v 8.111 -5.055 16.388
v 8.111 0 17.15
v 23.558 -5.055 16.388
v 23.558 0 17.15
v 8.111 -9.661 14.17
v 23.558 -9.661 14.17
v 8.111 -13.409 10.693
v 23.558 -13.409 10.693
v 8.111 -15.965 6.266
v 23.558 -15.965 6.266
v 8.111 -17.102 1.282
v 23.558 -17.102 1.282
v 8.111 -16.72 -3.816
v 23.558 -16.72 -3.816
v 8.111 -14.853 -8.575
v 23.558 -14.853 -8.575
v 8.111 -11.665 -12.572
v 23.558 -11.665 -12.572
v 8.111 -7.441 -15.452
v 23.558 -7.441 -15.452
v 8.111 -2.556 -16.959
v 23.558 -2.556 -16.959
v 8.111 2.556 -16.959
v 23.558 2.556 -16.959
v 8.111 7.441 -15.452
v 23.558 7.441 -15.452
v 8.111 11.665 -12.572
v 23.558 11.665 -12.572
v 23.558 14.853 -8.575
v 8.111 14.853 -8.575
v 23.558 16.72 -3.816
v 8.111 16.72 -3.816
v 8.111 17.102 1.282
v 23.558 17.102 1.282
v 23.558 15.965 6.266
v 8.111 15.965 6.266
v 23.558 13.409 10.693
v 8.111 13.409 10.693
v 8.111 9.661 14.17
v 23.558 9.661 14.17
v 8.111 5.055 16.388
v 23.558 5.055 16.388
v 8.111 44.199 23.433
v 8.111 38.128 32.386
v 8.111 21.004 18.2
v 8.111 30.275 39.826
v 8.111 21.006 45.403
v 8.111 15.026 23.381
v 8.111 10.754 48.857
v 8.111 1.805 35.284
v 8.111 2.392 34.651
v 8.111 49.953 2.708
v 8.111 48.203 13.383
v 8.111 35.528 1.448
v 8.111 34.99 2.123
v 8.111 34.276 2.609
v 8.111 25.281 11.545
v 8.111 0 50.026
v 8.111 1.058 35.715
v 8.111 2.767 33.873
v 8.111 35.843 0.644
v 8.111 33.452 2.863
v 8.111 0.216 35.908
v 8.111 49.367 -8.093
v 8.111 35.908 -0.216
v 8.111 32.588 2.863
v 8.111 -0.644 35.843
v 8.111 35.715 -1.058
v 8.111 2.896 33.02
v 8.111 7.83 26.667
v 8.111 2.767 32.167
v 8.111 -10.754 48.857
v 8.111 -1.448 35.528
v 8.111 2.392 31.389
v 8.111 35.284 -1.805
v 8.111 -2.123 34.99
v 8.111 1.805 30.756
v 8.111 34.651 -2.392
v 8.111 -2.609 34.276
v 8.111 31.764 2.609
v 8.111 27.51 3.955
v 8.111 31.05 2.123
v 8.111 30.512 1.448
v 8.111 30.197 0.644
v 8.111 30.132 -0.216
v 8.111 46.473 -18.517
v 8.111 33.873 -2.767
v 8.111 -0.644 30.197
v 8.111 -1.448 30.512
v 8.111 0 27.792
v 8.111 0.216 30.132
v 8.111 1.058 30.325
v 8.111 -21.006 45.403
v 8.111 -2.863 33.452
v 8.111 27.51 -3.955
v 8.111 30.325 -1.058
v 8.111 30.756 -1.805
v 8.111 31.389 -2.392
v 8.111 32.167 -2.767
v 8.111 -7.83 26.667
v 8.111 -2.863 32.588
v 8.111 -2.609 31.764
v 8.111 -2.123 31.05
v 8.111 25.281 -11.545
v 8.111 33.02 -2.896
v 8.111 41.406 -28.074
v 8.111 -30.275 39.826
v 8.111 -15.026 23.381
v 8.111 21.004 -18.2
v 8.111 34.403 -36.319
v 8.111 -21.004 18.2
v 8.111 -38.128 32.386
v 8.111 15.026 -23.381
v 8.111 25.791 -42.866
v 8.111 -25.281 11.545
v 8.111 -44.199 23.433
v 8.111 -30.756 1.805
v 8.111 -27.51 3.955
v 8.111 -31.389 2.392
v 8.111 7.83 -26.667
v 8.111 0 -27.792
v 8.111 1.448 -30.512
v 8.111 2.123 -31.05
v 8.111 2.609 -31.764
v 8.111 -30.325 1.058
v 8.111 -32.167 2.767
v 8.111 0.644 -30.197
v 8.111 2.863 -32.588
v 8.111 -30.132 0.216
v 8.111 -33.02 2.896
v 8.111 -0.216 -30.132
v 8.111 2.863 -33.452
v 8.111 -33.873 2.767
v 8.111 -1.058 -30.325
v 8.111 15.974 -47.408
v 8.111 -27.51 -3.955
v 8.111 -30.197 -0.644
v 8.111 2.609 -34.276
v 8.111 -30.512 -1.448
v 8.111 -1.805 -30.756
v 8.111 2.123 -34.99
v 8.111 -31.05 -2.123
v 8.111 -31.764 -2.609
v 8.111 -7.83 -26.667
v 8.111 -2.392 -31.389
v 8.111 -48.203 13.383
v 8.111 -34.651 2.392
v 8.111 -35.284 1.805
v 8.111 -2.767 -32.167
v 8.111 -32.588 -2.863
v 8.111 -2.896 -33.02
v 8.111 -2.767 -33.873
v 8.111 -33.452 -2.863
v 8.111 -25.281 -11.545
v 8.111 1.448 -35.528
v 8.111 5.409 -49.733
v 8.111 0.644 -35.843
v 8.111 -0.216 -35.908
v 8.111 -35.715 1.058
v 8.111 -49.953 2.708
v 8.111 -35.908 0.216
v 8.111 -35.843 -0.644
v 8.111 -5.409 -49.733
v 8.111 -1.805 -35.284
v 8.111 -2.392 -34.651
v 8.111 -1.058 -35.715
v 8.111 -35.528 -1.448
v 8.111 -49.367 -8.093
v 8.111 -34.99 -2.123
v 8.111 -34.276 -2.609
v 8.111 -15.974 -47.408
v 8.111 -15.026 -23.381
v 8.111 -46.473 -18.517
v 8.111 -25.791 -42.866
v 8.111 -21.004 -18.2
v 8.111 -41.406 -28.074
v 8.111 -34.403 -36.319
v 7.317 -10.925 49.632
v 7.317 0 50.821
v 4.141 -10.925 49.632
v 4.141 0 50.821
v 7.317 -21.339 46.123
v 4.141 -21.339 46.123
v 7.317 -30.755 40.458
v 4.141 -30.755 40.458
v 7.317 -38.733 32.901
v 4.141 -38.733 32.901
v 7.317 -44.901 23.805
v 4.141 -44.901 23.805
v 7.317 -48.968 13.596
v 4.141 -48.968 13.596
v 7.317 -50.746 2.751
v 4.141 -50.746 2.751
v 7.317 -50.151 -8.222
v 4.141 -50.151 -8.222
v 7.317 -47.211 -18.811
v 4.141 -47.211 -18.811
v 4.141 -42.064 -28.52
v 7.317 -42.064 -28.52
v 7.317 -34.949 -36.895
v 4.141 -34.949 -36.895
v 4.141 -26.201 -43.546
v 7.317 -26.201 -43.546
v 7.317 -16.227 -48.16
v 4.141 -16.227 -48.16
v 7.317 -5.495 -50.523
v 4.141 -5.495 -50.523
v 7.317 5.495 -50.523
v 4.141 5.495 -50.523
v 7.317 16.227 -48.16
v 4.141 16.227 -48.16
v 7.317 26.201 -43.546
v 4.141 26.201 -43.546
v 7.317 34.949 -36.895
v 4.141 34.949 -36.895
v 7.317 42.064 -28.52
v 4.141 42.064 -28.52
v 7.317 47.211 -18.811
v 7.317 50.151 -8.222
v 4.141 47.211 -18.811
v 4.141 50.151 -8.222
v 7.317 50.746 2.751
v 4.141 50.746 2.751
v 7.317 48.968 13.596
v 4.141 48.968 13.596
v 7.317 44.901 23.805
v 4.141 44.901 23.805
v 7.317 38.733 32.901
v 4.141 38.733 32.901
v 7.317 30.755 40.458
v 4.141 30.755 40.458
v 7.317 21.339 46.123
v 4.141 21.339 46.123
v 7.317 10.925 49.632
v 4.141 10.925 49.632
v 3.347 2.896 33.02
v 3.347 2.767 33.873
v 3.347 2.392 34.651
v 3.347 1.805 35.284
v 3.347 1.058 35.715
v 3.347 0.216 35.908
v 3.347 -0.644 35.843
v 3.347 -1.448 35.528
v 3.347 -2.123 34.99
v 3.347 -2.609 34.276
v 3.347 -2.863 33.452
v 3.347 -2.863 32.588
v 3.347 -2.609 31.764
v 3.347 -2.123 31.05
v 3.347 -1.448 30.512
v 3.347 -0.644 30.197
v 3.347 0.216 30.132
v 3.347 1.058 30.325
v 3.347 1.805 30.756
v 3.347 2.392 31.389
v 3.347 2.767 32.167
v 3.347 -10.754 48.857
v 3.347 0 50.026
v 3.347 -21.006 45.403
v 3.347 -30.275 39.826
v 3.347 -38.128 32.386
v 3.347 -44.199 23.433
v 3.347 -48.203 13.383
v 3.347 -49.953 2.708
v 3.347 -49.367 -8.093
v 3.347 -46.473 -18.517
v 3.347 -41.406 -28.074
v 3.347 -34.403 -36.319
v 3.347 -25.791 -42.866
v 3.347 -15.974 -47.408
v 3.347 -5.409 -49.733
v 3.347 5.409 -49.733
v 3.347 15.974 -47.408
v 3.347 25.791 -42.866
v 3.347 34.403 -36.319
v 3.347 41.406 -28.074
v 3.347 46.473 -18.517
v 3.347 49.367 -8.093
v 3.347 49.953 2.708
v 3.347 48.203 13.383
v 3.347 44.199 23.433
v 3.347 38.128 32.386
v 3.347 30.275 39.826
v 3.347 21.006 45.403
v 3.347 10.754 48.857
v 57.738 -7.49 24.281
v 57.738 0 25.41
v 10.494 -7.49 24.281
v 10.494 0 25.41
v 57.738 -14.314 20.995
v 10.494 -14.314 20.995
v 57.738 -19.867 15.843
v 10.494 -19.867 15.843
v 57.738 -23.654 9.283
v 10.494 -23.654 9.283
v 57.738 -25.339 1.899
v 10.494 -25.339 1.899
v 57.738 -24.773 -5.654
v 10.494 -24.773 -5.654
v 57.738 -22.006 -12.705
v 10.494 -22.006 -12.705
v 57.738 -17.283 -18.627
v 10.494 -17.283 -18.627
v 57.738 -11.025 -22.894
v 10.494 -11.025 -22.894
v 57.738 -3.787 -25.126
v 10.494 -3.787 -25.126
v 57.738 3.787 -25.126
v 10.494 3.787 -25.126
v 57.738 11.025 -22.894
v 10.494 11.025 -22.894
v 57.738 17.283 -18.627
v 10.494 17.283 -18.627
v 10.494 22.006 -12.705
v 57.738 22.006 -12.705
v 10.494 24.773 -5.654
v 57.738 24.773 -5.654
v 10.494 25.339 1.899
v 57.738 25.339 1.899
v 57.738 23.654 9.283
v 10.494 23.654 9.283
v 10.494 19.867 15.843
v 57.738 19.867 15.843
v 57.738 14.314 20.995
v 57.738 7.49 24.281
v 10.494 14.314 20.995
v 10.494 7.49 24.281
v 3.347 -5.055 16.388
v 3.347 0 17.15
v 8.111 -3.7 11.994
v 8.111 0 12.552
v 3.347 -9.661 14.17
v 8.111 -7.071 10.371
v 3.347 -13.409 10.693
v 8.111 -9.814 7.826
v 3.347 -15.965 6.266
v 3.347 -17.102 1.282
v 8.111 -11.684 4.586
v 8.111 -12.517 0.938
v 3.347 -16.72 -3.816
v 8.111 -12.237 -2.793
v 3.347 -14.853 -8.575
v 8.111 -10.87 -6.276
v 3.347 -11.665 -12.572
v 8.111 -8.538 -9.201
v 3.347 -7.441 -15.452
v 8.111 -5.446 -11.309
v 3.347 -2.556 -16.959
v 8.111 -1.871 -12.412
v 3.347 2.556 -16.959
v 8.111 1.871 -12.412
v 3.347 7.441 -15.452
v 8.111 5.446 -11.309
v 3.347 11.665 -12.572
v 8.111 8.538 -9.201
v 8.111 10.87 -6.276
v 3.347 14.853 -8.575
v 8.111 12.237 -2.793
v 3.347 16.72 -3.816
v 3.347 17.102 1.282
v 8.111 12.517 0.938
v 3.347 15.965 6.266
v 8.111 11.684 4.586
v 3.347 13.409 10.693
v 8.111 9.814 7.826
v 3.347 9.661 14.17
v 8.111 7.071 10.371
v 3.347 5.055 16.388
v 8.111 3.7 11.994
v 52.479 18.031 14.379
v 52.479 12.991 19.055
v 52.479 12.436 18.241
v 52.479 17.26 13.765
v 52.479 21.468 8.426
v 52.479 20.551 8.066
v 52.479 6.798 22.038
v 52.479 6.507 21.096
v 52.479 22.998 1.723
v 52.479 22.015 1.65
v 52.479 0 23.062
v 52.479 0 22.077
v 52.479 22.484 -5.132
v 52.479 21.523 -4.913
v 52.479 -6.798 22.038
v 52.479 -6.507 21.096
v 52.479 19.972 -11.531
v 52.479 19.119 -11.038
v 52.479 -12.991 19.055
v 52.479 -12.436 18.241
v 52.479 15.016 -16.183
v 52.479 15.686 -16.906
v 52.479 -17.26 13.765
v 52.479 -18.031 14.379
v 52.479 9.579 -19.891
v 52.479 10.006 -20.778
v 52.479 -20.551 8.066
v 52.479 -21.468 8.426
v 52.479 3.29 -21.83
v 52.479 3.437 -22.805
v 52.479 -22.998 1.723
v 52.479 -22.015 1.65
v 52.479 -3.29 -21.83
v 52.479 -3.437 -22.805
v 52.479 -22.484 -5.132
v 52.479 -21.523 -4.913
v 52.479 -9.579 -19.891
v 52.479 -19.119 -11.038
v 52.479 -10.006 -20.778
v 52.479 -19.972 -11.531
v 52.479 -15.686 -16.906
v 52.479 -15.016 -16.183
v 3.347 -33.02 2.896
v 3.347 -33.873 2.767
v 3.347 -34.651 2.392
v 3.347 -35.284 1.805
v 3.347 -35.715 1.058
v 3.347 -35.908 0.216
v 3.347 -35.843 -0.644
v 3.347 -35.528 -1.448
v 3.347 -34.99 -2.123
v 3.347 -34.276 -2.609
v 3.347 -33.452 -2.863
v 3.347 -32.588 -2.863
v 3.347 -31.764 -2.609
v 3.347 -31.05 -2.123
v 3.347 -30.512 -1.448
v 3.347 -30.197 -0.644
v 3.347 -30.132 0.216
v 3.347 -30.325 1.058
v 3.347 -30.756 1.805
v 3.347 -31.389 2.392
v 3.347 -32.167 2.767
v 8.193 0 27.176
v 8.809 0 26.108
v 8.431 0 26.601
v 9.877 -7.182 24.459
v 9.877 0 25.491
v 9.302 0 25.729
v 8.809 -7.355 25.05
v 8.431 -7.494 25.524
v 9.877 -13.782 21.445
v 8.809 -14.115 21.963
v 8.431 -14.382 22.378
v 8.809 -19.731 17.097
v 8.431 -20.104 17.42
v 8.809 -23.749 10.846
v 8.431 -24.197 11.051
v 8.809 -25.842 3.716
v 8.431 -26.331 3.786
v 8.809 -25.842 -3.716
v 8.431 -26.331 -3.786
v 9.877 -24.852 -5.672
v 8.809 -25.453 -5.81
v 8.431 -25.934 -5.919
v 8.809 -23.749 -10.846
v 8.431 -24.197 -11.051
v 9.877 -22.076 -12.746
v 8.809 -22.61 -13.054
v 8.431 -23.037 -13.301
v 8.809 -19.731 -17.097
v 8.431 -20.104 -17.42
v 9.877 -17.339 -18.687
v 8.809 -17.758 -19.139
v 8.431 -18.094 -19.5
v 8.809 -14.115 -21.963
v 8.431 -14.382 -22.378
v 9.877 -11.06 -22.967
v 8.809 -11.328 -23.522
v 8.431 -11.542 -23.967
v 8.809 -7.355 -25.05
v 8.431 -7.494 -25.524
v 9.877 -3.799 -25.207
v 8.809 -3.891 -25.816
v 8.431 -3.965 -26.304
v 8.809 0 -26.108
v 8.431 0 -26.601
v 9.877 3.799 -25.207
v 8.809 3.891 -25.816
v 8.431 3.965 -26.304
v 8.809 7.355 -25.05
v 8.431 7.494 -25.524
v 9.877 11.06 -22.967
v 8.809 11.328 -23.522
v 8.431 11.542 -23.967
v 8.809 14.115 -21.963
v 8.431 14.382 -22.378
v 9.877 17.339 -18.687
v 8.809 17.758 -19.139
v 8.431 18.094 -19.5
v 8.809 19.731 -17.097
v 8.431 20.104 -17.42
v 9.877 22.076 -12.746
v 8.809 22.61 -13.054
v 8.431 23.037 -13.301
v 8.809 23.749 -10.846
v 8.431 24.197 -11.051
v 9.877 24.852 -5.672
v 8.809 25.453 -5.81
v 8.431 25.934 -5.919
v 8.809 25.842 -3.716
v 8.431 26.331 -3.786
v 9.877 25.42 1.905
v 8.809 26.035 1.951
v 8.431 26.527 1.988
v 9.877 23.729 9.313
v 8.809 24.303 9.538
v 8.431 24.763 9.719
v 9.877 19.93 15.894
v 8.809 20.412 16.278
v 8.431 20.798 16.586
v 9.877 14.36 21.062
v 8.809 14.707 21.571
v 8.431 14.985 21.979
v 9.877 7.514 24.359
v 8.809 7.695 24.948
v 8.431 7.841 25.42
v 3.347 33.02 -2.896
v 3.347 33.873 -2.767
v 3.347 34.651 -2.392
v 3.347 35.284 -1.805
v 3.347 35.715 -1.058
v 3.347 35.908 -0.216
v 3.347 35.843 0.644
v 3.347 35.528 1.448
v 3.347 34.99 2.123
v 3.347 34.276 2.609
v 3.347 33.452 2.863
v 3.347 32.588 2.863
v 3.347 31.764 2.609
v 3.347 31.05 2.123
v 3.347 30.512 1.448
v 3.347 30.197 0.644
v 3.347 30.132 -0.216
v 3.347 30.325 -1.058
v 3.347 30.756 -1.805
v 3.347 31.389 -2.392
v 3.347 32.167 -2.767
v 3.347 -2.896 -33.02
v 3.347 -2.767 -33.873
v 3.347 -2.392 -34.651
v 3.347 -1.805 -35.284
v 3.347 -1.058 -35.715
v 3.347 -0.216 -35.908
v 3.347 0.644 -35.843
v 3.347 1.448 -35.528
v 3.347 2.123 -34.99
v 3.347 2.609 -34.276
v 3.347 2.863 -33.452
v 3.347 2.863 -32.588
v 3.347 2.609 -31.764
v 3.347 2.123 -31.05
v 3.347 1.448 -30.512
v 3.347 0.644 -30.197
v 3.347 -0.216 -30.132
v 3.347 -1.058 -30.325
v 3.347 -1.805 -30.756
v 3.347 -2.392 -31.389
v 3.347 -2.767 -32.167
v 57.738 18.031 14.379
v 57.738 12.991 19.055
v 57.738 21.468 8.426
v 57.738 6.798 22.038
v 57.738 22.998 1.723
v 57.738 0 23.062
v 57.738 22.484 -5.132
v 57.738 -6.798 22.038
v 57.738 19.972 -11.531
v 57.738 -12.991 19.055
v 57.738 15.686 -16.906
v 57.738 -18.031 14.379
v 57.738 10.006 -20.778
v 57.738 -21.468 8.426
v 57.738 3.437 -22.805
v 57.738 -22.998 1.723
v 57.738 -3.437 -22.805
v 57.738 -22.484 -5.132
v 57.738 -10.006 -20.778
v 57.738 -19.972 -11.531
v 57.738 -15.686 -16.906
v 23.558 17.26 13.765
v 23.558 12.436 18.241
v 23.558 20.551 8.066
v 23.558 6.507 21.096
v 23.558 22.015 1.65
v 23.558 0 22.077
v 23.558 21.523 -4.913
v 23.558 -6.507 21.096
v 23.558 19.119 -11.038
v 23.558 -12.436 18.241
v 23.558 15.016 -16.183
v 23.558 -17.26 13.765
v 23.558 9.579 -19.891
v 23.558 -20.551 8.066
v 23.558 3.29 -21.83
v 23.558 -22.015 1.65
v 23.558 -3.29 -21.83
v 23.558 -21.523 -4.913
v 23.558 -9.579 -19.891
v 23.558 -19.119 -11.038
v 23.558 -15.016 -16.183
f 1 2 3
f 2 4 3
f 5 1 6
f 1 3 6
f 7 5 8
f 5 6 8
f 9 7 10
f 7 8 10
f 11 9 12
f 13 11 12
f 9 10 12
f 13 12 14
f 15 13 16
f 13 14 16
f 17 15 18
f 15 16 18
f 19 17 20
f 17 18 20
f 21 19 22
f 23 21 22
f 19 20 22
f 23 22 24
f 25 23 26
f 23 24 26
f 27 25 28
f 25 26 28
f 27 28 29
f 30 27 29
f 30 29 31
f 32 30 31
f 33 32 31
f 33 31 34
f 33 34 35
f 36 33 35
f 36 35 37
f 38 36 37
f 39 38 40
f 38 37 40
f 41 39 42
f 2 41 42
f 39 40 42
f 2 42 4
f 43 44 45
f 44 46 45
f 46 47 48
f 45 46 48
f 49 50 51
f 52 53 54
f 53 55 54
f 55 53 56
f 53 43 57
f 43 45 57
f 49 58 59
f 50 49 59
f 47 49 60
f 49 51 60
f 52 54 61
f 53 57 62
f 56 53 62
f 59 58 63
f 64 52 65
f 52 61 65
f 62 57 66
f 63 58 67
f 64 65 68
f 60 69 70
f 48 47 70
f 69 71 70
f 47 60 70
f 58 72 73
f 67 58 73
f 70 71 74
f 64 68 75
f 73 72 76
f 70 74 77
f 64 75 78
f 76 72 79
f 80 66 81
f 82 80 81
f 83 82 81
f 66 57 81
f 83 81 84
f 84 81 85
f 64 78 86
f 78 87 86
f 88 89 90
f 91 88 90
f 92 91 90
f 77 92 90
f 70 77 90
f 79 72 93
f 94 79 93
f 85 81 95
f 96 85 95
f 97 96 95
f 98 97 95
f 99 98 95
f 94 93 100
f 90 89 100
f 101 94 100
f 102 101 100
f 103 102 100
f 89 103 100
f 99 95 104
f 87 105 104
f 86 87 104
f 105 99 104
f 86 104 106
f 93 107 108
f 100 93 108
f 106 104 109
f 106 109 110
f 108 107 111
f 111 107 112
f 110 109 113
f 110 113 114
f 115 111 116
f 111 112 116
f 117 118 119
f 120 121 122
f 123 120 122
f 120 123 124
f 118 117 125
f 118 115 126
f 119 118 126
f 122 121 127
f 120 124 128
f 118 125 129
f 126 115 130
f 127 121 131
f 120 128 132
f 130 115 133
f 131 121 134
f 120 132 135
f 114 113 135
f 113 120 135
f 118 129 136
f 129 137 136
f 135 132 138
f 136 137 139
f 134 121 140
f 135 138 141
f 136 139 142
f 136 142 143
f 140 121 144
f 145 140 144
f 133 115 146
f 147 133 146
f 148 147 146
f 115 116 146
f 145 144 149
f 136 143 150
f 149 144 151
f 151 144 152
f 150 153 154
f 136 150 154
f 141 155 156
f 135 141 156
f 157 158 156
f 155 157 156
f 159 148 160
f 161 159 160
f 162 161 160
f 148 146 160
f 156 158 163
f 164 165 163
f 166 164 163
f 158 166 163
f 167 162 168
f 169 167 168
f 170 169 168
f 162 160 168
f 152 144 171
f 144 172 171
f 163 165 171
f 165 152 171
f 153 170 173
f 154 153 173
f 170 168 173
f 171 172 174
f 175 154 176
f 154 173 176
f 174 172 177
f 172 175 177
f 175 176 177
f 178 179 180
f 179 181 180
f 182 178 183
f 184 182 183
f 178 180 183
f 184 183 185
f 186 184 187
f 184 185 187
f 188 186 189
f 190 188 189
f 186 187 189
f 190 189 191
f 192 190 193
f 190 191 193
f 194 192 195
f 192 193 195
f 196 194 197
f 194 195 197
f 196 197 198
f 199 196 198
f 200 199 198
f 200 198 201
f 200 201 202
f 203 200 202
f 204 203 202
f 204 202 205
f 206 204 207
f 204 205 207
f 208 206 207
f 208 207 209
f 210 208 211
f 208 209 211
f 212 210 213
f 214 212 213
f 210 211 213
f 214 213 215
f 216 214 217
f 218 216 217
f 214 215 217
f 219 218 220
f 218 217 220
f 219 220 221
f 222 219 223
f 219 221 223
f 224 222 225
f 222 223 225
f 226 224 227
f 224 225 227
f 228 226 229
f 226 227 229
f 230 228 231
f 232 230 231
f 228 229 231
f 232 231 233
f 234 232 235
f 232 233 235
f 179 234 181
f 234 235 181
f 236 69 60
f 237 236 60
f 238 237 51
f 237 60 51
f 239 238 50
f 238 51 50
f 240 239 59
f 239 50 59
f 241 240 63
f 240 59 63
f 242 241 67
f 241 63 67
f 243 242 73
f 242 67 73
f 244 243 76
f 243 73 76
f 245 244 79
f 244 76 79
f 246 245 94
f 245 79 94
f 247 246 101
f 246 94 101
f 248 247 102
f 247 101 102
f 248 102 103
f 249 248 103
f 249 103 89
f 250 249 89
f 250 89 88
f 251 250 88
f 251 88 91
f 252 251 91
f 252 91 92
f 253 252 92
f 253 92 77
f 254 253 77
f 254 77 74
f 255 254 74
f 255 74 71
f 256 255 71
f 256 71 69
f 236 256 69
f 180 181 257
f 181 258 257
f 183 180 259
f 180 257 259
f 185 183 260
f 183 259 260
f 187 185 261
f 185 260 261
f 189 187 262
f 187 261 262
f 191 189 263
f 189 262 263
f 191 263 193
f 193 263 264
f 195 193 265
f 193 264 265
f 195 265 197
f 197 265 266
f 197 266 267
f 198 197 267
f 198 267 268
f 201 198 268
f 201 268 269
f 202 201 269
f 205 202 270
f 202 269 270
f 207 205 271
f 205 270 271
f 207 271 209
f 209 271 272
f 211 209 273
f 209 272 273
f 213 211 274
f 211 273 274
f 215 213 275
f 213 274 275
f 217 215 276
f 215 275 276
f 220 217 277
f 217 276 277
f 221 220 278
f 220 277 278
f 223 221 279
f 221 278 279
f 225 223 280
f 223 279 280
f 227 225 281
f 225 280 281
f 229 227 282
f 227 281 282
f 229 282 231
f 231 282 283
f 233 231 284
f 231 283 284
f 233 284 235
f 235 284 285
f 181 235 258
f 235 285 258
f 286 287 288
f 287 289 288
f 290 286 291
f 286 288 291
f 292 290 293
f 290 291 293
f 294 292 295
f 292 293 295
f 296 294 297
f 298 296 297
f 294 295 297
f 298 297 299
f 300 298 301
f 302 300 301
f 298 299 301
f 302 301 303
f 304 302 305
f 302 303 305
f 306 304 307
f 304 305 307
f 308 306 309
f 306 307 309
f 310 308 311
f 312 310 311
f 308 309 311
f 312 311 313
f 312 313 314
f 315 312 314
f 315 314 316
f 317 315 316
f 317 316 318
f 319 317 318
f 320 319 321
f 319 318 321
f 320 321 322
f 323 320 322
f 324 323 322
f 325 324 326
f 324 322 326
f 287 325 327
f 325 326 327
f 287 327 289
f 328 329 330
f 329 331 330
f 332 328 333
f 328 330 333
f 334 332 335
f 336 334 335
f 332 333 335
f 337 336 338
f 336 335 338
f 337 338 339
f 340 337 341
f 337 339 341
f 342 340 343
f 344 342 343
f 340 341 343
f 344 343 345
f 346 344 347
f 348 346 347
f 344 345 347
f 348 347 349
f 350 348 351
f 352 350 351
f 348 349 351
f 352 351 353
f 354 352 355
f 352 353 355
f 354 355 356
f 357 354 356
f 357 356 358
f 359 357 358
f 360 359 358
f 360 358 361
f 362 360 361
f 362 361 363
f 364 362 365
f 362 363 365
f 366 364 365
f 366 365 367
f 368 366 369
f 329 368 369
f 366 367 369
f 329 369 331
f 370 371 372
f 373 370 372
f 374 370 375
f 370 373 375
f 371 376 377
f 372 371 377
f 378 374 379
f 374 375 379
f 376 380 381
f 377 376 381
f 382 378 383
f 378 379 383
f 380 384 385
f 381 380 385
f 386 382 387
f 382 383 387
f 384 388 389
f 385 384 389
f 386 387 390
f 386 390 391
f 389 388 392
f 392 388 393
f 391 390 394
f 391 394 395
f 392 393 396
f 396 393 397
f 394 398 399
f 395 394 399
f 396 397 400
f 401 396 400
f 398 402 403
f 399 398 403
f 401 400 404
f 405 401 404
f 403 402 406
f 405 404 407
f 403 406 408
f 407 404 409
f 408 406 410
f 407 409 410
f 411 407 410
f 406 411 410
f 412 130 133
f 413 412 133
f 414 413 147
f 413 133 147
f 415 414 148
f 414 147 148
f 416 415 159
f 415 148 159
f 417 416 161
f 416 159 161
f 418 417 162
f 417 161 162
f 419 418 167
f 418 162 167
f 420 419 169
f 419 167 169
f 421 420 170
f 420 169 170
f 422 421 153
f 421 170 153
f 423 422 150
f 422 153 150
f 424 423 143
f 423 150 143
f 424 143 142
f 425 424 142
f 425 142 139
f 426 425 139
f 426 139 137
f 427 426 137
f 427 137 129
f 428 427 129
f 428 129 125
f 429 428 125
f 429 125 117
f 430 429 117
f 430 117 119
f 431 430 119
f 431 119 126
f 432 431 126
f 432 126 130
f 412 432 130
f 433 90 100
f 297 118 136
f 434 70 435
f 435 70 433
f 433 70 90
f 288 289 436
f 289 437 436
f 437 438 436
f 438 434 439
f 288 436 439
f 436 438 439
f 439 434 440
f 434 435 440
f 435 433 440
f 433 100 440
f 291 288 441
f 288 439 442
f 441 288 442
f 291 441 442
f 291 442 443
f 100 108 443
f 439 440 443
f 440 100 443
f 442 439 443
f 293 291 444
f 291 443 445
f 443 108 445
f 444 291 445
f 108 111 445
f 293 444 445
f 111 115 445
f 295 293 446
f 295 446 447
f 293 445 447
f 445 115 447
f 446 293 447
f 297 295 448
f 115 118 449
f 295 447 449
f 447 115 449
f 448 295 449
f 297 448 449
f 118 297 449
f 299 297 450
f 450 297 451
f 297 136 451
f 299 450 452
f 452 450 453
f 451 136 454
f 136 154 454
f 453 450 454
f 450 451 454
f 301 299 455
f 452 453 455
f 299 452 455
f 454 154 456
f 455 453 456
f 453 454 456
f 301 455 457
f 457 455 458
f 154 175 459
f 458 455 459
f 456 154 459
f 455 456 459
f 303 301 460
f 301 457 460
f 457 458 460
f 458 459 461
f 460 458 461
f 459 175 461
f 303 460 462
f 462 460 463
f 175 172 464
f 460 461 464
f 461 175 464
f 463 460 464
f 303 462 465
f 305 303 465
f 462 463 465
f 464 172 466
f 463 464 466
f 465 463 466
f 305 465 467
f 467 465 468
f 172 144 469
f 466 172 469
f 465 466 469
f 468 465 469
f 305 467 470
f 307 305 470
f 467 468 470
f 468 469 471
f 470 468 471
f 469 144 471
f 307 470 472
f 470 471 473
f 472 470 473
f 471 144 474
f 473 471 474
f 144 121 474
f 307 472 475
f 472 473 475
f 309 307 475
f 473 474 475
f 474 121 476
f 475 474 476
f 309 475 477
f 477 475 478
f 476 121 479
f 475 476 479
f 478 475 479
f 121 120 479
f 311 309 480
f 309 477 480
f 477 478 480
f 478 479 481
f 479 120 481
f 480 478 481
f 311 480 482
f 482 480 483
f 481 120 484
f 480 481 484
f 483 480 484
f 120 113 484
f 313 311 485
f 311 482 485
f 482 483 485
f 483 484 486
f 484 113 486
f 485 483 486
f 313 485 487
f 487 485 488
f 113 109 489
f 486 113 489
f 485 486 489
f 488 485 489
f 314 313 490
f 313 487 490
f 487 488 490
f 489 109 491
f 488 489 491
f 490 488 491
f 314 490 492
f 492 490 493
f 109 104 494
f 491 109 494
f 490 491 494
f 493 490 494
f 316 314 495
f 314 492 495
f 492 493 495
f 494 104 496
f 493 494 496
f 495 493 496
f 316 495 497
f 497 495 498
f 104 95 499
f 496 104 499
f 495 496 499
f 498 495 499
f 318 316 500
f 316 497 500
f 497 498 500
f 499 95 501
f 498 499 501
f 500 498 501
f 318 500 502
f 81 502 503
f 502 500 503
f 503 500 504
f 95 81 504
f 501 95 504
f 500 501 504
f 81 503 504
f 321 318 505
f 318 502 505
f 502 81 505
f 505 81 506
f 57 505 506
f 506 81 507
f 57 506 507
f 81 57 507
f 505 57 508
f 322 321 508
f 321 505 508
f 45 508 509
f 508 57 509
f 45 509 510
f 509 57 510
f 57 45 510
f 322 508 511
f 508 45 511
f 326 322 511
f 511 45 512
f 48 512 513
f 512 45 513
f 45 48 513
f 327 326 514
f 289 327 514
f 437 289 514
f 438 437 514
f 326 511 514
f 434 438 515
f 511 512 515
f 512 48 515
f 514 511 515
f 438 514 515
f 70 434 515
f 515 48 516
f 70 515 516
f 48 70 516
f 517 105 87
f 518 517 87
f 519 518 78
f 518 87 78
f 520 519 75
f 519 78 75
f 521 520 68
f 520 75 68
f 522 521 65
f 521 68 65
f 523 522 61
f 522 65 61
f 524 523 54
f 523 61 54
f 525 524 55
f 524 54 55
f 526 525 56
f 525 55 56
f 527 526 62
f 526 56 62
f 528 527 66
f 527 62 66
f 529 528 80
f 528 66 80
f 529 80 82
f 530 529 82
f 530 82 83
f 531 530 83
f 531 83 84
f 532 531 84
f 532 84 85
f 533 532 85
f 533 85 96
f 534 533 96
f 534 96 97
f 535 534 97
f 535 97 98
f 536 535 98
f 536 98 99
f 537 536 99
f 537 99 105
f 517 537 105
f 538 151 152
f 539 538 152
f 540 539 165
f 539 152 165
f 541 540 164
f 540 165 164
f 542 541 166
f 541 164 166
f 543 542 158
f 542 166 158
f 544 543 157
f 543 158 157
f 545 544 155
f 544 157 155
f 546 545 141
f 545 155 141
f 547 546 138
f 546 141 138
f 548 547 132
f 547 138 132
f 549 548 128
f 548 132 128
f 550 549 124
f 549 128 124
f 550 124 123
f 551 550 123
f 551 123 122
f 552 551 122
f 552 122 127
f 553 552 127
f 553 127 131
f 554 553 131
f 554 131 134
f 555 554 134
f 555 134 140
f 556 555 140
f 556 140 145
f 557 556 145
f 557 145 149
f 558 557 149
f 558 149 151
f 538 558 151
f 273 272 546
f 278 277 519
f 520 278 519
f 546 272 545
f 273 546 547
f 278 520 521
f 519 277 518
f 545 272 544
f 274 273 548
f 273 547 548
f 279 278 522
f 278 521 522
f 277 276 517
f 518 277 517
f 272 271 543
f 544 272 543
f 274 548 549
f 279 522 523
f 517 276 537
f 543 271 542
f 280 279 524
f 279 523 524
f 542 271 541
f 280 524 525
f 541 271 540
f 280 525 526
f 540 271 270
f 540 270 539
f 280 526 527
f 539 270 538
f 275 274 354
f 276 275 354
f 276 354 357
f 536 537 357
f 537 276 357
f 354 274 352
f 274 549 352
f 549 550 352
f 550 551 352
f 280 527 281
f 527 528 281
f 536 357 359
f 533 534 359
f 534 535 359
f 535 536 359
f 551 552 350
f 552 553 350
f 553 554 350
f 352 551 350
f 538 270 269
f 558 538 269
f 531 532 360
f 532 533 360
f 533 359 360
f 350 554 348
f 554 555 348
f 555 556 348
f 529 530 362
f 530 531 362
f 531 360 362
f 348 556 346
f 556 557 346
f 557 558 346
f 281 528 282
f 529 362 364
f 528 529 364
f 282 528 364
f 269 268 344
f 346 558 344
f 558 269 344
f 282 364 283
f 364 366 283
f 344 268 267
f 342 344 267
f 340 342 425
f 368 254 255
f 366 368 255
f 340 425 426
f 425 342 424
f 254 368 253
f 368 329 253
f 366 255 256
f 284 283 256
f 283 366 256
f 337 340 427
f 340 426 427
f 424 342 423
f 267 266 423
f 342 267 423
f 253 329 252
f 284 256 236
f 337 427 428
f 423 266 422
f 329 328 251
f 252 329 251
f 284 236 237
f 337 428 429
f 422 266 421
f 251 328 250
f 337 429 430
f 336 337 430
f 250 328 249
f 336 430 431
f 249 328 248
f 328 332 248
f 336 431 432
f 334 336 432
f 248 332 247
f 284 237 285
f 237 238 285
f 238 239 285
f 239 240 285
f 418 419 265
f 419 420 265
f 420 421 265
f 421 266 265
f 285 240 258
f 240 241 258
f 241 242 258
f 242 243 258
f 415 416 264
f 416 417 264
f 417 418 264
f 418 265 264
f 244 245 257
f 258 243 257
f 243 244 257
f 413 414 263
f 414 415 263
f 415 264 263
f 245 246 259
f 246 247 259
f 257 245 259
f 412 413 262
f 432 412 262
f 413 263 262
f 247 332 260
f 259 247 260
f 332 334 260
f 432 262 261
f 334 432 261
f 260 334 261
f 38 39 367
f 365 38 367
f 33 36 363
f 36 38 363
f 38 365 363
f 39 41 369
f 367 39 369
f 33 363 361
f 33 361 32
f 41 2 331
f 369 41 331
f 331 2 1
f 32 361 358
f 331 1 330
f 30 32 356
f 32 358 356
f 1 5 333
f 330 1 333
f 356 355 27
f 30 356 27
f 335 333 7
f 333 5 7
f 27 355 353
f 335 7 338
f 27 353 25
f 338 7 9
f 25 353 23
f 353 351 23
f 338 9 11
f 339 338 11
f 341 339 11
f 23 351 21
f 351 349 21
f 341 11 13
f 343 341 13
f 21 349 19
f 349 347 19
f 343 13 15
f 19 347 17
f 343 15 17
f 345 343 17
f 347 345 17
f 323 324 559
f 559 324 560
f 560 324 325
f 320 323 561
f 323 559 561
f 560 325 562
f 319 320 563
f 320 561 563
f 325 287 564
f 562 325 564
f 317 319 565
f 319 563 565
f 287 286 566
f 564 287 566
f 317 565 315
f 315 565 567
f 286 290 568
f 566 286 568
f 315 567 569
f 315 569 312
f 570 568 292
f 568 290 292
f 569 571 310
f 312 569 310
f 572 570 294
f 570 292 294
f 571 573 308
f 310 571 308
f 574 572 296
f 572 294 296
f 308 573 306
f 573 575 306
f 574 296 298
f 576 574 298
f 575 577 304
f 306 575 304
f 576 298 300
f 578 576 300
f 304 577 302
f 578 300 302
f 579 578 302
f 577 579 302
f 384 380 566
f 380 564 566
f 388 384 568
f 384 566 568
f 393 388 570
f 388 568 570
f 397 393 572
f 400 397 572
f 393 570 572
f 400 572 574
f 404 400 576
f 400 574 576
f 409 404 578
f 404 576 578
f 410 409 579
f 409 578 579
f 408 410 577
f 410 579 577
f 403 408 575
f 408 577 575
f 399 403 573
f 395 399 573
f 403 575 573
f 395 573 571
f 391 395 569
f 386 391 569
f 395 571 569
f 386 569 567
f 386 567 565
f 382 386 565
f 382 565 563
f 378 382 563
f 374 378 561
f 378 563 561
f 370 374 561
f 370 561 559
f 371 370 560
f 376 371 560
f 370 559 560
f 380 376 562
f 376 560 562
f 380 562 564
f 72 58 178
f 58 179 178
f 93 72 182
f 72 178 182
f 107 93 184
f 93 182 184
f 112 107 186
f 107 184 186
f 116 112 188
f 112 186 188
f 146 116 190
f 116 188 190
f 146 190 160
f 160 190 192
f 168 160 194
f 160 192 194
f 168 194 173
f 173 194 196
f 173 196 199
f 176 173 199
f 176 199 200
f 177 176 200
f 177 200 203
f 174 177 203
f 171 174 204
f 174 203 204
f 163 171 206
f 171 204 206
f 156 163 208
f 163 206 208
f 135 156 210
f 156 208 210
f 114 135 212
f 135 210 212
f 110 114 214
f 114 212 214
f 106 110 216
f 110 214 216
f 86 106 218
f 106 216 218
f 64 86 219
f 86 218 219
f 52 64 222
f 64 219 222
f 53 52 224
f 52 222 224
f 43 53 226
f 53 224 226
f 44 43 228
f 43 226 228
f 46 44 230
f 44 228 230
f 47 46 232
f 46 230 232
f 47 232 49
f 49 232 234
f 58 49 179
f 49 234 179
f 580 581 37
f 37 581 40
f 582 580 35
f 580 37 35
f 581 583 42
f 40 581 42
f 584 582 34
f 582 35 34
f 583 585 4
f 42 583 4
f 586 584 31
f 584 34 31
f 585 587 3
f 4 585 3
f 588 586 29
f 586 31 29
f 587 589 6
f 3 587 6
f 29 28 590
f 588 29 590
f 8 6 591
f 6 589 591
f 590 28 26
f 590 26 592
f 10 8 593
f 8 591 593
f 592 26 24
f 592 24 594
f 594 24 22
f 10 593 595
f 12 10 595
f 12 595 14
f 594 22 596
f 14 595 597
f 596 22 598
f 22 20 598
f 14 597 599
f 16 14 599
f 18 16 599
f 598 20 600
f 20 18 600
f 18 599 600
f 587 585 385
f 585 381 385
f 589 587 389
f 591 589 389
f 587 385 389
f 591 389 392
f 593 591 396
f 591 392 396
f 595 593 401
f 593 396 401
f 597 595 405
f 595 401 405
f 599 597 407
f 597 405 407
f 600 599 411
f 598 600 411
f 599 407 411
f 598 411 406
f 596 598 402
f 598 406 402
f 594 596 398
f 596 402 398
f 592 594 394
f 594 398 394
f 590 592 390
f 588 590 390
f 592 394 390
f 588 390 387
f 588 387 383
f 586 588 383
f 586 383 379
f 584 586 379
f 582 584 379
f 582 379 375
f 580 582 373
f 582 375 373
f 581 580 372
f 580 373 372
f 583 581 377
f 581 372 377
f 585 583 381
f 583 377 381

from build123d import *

# Parameters (mm, degrees)
HOLE_WIZARD_12_1_D       = 5.7912
PATTERN_CIRCULAR_1_COUNT = 4


with BuildPart() as part:
    # Model → 旋转1 (revolve)
    with BuildSketch(Plane.XY):
        with BuildLine():
            Line((8.11136174, 12.552108092), (8.11136174, 17.150272129))
            Line((8.11136174, 17.150272129), (23.557930854, 17.150272129))
            Line((23.557930854, 17.150272129), (23.557930854, 22.076877203))
            Line((23.557930854, 22.076877203), (52.479166263, 22.076877203))
            Line((52.479166263, 22.076877203), (52.479166263, 23.062198021))
            Line((52.479166263, 23.062198021), (57.737573082, 23.062198021))
            Line((57.737573082, 23.062198021), (57.737573082, 25.410254309))
            Line((57.737573082, 25.410254309), (10.493573082, 25.410254309))
            ThreePointArc((10.493573082, 25.410254309), (8.809095288, 26.107987857), (8.11136174, 27.792465651))
            Line((8.11136174, 27.792465651), (8.11136174, 50.026438172))
            Line((8.11136174, 50.026438172), (7.317291293, 50.820508619))
            Line((7.317291293, 50.820508619), (4.141009504, 50.820508619))
            Line((4.141009504, 50.820508619), (3.346939057, 50.026438172))
            Line((3.346939057, 50.026438172), (3.346939057, 17.150272129))
            Line((3.346939057, 17.150272129), (8.11136174, 12.552108092))
        make_face()
    revolve(axis=Axis((0, 0, 0), (1, 0, 0)))

    # #12 间隙孔1 (through all)
    with Locations(Plane.ZY.offset(-3.346939057)):
        with Locations((0, 33.02)):
            hole_wizard_12_1 = Hole(HOLE_WIZARD_12_1_D / 2)

    # 阵列(圆周)1: #12 间隙孔1 ×4 about axis
    pattern_circular_1_axis = Axis((57.737573082, 0, 0), (-1, 0, 0))
    for i in range(1, PATTERN_CIRCULAR_1_COUNT):
        add(hole_wizard_12_1.rotate(pattern_circular_1_axis, i * 360 / PATTERN_CIRCULAR_1_COUNT), mode=Mode.SUBTRACT)


solid = part.part
